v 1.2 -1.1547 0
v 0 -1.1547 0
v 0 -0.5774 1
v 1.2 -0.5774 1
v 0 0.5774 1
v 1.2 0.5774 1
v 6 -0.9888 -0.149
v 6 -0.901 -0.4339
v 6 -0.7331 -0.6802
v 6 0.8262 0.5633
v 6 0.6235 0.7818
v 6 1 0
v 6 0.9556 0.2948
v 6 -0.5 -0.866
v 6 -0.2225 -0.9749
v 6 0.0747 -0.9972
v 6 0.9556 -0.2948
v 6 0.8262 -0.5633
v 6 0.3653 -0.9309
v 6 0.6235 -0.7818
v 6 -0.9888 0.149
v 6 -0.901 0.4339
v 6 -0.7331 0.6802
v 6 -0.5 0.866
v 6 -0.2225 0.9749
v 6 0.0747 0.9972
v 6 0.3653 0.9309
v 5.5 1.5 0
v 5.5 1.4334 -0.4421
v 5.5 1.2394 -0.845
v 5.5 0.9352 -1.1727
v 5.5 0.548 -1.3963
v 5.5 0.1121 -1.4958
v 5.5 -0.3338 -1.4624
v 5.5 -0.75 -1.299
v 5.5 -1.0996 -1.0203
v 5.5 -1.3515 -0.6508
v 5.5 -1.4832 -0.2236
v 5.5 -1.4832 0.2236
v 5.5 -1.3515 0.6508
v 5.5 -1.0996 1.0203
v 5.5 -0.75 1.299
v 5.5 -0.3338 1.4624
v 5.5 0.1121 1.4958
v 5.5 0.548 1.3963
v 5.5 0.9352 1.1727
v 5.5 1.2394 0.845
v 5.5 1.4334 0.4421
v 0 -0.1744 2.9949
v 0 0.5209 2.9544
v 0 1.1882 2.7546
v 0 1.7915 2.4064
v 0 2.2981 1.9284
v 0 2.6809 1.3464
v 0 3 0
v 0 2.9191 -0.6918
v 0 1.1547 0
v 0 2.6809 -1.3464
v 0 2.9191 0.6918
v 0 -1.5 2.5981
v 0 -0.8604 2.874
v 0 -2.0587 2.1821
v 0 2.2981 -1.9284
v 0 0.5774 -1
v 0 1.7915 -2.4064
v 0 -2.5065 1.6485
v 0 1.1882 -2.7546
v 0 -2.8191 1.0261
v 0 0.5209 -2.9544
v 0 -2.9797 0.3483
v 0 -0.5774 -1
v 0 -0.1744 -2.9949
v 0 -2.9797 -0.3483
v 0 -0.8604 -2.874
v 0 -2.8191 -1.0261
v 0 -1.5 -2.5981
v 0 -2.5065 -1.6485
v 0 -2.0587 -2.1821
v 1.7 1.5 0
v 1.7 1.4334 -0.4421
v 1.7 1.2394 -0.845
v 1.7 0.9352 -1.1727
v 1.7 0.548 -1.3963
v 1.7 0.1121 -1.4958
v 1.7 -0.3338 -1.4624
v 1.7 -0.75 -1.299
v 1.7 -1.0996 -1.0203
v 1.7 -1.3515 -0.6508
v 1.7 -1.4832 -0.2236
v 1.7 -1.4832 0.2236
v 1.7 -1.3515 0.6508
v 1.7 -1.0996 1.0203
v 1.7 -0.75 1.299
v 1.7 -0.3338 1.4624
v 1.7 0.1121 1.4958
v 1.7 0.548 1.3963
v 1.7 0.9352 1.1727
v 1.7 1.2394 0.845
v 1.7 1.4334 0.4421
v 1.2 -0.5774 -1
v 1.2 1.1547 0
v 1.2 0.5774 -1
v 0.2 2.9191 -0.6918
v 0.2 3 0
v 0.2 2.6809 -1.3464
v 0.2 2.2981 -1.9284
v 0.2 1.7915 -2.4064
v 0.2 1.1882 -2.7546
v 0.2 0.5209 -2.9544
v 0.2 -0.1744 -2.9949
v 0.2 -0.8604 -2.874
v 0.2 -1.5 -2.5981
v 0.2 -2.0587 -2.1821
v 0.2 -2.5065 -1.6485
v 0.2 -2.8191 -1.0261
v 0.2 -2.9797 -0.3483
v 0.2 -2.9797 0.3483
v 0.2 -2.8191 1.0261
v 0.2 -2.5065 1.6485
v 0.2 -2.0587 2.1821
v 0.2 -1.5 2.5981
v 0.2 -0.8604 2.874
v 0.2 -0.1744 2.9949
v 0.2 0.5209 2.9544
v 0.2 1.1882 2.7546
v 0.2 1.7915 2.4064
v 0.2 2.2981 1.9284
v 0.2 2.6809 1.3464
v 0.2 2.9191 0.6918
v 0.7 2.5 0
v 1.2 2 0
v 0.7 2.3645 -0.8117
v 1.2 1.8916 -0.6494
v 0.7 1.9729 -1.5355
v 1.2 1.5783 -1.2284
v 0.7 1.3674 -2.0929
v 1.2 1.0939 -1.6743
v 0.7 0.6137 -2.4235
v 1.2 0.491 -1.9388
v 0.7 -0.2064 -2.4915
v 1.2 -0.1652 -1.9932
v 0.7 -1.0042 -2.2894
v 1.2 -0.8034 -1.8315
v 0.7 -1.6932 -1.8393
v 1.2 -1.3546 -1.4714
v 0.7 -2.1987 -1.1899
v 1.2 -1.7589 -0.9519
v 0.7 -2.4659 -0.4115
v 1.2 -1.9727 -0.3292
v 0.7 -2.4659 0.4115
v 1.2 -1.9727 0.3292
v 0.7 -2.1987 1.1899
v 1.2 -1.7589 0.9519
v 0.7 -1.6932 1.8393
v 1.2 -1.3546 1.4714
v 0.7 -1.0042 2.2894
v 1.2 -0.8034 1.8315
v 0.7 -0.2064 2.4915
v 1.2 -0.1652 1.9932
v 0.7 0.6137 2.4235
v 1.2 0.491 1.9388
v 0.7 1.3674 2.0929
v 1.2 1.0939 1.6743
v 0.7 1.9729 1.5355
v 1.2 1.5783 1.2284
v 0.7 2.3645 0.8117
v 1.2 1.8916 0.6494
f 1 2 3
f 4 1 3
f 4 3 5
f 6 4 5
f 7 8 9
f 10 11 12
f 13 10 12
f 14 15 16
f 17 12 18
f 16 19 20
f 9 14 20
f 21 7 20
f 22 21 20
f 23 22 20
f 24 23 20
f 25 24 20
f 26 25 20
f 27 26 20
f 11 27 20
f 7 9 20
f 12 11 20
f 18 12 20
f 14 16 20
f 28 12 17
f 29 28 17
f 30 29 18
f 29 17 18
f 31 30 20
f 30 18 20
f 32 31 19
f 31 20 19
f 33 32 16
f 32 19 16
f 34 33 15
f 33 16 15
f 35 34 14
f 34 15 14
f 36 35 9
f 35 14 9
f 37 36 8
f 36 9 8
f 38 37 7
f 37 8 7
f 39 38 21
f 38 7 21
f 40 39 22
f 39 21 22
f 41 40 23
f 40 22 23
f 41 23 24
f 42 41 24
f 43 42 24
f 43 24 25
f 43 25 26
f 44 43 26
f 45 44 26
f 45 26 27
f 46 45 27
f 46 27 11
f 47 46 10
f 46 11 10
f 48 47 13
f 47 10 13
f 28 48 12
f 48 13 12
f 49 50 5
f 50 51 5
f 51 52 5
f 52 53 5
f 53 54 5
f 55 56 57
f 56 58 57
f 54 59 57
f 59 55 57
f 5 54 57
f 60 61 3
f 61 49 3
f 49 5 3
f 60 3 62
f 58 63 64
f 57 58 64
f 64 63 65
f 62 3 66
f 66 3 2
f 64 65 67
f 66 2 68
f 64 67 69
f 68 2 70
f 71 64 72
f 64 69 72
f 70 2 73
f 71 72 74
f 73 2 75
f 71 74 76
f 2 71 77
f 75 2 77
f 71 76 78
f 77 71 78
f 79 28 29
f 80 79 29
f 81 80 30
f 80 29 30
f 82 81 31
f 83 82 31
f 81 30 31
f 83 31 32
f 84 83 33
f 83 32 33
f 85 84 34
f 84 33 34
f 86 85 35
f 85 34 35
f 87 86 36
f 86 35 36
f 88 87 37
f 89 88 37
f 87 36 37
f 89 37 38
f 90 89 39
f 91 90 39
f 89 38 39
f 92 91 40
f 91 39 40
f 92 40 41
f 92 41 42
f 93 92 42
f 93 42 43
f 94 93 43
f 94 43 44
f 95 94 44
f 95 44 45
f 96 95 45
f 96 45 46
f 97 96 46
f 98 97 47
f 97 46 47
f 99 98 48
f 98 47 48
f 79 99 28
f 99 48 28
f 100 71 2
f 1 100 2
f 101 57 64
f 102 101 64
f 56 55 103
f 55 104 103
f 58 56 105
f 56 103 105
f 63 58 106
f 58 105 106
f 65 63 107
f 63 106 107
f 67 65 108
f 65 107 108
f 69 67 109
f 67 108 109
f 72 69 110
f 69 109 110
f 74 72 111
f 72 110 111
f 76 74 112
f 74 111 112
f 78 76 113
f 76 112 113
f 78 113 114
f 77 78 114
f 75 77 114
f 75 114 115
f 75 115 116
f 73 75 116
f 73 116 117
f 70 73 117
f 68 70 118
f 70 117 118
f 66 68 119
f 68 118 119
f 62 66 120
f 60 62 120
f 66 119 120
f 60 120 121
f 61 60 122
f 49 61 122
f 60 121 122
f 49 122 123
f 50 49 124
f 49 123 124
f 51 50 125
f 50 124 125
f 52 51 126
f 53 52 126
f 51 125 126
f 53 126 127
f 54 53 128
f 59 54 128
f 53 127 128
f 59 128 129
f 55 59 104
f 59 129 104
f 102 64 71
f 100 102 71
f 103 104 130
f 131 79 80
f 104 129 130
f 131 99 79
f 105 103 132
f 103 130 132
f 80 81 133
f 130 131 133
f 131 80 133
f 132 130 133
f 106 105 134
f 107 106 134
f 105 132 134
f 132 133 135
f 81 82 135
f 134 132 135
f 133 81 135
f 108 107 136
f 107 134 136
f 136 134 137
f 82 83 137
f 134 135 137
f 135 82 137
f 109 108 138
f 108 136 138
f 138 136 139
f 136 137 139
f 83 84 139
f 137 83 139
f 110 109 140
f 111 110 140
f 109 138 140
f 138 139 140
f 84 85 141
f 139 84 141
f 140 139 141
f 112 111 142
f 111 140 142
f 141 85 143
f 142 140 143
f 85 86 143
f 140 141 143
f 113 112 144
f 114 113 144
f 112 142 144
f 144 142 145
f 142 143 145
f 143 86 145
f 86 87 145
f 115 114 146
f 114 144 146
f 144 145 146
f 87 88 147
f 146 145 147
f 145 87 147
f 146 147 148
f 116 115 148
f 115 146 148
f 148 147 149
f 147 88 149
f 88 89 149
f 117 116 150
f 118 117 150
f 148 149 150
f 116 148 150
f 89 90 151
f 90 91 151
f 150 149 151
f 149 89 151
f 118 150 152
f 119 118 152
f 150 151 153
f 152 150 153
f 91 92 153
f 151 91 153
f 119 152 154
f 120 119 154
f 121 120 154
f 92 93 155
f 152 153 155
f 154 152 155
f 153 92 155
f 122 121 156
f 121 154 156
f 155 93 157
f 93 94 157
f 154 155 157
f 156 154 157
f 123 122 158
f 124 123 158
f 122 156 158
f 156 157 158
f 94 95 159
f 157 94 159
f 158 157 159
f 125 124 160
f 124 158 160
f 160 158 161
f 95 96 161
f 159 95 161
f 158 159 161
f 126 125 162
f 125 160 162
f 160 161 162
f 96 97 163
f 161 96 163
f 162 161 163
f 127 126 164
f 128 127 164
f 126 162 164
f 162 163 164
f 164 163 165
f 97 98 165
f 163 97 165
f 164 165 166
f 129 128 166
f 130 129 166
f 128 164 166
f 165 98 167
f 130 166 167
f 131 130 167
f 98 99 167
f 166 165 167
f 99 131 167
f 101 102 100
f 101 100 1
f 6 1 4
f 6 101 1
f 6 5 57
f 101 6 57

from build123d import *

# Parameters (mm, degrees)
CHANFREIN1_SIZE         = 0.5
ENL_V_MAT_EXTRU_1_DEPTH = 1.2


with BuildPart() as part:
    # Esquisse1 → Révolution1 (revolve)
    with BuildSketch(Plane.XY):
        Polygon((0, 0), (0, 3), (0.2, 3), (1.7, 1.5), (6, 1.5), (6, 0), align=None)
    revolve(axis=Axis((6, 0, 0), (-1, 0, 0)))

    # Chanfrein1
    chanfrein1_edges = [part.edges().sort_by_distance(p)[0] for p in [
        (6, -1.5, 0),
    ]]
    chamfer(chanfrein1_edges, length=CHANFREIN1_SIZE)

    # Esquisse2 → Enlèv. mat.-Extru.1 (cut)
    with BuildSketch(Plane.ZY):
        Polygon((0, 1.154700538), (-1, 0.577350269), (-1, -0.577350269), (0, -1.154700538), (1, -0.577350269), (1, 0.577350269), align=None)
    extrude(amount=-ENL_V_MAT_EXTRU_1_DEPTH, mode=Mode.SUBTRACT)


solid = part.part
